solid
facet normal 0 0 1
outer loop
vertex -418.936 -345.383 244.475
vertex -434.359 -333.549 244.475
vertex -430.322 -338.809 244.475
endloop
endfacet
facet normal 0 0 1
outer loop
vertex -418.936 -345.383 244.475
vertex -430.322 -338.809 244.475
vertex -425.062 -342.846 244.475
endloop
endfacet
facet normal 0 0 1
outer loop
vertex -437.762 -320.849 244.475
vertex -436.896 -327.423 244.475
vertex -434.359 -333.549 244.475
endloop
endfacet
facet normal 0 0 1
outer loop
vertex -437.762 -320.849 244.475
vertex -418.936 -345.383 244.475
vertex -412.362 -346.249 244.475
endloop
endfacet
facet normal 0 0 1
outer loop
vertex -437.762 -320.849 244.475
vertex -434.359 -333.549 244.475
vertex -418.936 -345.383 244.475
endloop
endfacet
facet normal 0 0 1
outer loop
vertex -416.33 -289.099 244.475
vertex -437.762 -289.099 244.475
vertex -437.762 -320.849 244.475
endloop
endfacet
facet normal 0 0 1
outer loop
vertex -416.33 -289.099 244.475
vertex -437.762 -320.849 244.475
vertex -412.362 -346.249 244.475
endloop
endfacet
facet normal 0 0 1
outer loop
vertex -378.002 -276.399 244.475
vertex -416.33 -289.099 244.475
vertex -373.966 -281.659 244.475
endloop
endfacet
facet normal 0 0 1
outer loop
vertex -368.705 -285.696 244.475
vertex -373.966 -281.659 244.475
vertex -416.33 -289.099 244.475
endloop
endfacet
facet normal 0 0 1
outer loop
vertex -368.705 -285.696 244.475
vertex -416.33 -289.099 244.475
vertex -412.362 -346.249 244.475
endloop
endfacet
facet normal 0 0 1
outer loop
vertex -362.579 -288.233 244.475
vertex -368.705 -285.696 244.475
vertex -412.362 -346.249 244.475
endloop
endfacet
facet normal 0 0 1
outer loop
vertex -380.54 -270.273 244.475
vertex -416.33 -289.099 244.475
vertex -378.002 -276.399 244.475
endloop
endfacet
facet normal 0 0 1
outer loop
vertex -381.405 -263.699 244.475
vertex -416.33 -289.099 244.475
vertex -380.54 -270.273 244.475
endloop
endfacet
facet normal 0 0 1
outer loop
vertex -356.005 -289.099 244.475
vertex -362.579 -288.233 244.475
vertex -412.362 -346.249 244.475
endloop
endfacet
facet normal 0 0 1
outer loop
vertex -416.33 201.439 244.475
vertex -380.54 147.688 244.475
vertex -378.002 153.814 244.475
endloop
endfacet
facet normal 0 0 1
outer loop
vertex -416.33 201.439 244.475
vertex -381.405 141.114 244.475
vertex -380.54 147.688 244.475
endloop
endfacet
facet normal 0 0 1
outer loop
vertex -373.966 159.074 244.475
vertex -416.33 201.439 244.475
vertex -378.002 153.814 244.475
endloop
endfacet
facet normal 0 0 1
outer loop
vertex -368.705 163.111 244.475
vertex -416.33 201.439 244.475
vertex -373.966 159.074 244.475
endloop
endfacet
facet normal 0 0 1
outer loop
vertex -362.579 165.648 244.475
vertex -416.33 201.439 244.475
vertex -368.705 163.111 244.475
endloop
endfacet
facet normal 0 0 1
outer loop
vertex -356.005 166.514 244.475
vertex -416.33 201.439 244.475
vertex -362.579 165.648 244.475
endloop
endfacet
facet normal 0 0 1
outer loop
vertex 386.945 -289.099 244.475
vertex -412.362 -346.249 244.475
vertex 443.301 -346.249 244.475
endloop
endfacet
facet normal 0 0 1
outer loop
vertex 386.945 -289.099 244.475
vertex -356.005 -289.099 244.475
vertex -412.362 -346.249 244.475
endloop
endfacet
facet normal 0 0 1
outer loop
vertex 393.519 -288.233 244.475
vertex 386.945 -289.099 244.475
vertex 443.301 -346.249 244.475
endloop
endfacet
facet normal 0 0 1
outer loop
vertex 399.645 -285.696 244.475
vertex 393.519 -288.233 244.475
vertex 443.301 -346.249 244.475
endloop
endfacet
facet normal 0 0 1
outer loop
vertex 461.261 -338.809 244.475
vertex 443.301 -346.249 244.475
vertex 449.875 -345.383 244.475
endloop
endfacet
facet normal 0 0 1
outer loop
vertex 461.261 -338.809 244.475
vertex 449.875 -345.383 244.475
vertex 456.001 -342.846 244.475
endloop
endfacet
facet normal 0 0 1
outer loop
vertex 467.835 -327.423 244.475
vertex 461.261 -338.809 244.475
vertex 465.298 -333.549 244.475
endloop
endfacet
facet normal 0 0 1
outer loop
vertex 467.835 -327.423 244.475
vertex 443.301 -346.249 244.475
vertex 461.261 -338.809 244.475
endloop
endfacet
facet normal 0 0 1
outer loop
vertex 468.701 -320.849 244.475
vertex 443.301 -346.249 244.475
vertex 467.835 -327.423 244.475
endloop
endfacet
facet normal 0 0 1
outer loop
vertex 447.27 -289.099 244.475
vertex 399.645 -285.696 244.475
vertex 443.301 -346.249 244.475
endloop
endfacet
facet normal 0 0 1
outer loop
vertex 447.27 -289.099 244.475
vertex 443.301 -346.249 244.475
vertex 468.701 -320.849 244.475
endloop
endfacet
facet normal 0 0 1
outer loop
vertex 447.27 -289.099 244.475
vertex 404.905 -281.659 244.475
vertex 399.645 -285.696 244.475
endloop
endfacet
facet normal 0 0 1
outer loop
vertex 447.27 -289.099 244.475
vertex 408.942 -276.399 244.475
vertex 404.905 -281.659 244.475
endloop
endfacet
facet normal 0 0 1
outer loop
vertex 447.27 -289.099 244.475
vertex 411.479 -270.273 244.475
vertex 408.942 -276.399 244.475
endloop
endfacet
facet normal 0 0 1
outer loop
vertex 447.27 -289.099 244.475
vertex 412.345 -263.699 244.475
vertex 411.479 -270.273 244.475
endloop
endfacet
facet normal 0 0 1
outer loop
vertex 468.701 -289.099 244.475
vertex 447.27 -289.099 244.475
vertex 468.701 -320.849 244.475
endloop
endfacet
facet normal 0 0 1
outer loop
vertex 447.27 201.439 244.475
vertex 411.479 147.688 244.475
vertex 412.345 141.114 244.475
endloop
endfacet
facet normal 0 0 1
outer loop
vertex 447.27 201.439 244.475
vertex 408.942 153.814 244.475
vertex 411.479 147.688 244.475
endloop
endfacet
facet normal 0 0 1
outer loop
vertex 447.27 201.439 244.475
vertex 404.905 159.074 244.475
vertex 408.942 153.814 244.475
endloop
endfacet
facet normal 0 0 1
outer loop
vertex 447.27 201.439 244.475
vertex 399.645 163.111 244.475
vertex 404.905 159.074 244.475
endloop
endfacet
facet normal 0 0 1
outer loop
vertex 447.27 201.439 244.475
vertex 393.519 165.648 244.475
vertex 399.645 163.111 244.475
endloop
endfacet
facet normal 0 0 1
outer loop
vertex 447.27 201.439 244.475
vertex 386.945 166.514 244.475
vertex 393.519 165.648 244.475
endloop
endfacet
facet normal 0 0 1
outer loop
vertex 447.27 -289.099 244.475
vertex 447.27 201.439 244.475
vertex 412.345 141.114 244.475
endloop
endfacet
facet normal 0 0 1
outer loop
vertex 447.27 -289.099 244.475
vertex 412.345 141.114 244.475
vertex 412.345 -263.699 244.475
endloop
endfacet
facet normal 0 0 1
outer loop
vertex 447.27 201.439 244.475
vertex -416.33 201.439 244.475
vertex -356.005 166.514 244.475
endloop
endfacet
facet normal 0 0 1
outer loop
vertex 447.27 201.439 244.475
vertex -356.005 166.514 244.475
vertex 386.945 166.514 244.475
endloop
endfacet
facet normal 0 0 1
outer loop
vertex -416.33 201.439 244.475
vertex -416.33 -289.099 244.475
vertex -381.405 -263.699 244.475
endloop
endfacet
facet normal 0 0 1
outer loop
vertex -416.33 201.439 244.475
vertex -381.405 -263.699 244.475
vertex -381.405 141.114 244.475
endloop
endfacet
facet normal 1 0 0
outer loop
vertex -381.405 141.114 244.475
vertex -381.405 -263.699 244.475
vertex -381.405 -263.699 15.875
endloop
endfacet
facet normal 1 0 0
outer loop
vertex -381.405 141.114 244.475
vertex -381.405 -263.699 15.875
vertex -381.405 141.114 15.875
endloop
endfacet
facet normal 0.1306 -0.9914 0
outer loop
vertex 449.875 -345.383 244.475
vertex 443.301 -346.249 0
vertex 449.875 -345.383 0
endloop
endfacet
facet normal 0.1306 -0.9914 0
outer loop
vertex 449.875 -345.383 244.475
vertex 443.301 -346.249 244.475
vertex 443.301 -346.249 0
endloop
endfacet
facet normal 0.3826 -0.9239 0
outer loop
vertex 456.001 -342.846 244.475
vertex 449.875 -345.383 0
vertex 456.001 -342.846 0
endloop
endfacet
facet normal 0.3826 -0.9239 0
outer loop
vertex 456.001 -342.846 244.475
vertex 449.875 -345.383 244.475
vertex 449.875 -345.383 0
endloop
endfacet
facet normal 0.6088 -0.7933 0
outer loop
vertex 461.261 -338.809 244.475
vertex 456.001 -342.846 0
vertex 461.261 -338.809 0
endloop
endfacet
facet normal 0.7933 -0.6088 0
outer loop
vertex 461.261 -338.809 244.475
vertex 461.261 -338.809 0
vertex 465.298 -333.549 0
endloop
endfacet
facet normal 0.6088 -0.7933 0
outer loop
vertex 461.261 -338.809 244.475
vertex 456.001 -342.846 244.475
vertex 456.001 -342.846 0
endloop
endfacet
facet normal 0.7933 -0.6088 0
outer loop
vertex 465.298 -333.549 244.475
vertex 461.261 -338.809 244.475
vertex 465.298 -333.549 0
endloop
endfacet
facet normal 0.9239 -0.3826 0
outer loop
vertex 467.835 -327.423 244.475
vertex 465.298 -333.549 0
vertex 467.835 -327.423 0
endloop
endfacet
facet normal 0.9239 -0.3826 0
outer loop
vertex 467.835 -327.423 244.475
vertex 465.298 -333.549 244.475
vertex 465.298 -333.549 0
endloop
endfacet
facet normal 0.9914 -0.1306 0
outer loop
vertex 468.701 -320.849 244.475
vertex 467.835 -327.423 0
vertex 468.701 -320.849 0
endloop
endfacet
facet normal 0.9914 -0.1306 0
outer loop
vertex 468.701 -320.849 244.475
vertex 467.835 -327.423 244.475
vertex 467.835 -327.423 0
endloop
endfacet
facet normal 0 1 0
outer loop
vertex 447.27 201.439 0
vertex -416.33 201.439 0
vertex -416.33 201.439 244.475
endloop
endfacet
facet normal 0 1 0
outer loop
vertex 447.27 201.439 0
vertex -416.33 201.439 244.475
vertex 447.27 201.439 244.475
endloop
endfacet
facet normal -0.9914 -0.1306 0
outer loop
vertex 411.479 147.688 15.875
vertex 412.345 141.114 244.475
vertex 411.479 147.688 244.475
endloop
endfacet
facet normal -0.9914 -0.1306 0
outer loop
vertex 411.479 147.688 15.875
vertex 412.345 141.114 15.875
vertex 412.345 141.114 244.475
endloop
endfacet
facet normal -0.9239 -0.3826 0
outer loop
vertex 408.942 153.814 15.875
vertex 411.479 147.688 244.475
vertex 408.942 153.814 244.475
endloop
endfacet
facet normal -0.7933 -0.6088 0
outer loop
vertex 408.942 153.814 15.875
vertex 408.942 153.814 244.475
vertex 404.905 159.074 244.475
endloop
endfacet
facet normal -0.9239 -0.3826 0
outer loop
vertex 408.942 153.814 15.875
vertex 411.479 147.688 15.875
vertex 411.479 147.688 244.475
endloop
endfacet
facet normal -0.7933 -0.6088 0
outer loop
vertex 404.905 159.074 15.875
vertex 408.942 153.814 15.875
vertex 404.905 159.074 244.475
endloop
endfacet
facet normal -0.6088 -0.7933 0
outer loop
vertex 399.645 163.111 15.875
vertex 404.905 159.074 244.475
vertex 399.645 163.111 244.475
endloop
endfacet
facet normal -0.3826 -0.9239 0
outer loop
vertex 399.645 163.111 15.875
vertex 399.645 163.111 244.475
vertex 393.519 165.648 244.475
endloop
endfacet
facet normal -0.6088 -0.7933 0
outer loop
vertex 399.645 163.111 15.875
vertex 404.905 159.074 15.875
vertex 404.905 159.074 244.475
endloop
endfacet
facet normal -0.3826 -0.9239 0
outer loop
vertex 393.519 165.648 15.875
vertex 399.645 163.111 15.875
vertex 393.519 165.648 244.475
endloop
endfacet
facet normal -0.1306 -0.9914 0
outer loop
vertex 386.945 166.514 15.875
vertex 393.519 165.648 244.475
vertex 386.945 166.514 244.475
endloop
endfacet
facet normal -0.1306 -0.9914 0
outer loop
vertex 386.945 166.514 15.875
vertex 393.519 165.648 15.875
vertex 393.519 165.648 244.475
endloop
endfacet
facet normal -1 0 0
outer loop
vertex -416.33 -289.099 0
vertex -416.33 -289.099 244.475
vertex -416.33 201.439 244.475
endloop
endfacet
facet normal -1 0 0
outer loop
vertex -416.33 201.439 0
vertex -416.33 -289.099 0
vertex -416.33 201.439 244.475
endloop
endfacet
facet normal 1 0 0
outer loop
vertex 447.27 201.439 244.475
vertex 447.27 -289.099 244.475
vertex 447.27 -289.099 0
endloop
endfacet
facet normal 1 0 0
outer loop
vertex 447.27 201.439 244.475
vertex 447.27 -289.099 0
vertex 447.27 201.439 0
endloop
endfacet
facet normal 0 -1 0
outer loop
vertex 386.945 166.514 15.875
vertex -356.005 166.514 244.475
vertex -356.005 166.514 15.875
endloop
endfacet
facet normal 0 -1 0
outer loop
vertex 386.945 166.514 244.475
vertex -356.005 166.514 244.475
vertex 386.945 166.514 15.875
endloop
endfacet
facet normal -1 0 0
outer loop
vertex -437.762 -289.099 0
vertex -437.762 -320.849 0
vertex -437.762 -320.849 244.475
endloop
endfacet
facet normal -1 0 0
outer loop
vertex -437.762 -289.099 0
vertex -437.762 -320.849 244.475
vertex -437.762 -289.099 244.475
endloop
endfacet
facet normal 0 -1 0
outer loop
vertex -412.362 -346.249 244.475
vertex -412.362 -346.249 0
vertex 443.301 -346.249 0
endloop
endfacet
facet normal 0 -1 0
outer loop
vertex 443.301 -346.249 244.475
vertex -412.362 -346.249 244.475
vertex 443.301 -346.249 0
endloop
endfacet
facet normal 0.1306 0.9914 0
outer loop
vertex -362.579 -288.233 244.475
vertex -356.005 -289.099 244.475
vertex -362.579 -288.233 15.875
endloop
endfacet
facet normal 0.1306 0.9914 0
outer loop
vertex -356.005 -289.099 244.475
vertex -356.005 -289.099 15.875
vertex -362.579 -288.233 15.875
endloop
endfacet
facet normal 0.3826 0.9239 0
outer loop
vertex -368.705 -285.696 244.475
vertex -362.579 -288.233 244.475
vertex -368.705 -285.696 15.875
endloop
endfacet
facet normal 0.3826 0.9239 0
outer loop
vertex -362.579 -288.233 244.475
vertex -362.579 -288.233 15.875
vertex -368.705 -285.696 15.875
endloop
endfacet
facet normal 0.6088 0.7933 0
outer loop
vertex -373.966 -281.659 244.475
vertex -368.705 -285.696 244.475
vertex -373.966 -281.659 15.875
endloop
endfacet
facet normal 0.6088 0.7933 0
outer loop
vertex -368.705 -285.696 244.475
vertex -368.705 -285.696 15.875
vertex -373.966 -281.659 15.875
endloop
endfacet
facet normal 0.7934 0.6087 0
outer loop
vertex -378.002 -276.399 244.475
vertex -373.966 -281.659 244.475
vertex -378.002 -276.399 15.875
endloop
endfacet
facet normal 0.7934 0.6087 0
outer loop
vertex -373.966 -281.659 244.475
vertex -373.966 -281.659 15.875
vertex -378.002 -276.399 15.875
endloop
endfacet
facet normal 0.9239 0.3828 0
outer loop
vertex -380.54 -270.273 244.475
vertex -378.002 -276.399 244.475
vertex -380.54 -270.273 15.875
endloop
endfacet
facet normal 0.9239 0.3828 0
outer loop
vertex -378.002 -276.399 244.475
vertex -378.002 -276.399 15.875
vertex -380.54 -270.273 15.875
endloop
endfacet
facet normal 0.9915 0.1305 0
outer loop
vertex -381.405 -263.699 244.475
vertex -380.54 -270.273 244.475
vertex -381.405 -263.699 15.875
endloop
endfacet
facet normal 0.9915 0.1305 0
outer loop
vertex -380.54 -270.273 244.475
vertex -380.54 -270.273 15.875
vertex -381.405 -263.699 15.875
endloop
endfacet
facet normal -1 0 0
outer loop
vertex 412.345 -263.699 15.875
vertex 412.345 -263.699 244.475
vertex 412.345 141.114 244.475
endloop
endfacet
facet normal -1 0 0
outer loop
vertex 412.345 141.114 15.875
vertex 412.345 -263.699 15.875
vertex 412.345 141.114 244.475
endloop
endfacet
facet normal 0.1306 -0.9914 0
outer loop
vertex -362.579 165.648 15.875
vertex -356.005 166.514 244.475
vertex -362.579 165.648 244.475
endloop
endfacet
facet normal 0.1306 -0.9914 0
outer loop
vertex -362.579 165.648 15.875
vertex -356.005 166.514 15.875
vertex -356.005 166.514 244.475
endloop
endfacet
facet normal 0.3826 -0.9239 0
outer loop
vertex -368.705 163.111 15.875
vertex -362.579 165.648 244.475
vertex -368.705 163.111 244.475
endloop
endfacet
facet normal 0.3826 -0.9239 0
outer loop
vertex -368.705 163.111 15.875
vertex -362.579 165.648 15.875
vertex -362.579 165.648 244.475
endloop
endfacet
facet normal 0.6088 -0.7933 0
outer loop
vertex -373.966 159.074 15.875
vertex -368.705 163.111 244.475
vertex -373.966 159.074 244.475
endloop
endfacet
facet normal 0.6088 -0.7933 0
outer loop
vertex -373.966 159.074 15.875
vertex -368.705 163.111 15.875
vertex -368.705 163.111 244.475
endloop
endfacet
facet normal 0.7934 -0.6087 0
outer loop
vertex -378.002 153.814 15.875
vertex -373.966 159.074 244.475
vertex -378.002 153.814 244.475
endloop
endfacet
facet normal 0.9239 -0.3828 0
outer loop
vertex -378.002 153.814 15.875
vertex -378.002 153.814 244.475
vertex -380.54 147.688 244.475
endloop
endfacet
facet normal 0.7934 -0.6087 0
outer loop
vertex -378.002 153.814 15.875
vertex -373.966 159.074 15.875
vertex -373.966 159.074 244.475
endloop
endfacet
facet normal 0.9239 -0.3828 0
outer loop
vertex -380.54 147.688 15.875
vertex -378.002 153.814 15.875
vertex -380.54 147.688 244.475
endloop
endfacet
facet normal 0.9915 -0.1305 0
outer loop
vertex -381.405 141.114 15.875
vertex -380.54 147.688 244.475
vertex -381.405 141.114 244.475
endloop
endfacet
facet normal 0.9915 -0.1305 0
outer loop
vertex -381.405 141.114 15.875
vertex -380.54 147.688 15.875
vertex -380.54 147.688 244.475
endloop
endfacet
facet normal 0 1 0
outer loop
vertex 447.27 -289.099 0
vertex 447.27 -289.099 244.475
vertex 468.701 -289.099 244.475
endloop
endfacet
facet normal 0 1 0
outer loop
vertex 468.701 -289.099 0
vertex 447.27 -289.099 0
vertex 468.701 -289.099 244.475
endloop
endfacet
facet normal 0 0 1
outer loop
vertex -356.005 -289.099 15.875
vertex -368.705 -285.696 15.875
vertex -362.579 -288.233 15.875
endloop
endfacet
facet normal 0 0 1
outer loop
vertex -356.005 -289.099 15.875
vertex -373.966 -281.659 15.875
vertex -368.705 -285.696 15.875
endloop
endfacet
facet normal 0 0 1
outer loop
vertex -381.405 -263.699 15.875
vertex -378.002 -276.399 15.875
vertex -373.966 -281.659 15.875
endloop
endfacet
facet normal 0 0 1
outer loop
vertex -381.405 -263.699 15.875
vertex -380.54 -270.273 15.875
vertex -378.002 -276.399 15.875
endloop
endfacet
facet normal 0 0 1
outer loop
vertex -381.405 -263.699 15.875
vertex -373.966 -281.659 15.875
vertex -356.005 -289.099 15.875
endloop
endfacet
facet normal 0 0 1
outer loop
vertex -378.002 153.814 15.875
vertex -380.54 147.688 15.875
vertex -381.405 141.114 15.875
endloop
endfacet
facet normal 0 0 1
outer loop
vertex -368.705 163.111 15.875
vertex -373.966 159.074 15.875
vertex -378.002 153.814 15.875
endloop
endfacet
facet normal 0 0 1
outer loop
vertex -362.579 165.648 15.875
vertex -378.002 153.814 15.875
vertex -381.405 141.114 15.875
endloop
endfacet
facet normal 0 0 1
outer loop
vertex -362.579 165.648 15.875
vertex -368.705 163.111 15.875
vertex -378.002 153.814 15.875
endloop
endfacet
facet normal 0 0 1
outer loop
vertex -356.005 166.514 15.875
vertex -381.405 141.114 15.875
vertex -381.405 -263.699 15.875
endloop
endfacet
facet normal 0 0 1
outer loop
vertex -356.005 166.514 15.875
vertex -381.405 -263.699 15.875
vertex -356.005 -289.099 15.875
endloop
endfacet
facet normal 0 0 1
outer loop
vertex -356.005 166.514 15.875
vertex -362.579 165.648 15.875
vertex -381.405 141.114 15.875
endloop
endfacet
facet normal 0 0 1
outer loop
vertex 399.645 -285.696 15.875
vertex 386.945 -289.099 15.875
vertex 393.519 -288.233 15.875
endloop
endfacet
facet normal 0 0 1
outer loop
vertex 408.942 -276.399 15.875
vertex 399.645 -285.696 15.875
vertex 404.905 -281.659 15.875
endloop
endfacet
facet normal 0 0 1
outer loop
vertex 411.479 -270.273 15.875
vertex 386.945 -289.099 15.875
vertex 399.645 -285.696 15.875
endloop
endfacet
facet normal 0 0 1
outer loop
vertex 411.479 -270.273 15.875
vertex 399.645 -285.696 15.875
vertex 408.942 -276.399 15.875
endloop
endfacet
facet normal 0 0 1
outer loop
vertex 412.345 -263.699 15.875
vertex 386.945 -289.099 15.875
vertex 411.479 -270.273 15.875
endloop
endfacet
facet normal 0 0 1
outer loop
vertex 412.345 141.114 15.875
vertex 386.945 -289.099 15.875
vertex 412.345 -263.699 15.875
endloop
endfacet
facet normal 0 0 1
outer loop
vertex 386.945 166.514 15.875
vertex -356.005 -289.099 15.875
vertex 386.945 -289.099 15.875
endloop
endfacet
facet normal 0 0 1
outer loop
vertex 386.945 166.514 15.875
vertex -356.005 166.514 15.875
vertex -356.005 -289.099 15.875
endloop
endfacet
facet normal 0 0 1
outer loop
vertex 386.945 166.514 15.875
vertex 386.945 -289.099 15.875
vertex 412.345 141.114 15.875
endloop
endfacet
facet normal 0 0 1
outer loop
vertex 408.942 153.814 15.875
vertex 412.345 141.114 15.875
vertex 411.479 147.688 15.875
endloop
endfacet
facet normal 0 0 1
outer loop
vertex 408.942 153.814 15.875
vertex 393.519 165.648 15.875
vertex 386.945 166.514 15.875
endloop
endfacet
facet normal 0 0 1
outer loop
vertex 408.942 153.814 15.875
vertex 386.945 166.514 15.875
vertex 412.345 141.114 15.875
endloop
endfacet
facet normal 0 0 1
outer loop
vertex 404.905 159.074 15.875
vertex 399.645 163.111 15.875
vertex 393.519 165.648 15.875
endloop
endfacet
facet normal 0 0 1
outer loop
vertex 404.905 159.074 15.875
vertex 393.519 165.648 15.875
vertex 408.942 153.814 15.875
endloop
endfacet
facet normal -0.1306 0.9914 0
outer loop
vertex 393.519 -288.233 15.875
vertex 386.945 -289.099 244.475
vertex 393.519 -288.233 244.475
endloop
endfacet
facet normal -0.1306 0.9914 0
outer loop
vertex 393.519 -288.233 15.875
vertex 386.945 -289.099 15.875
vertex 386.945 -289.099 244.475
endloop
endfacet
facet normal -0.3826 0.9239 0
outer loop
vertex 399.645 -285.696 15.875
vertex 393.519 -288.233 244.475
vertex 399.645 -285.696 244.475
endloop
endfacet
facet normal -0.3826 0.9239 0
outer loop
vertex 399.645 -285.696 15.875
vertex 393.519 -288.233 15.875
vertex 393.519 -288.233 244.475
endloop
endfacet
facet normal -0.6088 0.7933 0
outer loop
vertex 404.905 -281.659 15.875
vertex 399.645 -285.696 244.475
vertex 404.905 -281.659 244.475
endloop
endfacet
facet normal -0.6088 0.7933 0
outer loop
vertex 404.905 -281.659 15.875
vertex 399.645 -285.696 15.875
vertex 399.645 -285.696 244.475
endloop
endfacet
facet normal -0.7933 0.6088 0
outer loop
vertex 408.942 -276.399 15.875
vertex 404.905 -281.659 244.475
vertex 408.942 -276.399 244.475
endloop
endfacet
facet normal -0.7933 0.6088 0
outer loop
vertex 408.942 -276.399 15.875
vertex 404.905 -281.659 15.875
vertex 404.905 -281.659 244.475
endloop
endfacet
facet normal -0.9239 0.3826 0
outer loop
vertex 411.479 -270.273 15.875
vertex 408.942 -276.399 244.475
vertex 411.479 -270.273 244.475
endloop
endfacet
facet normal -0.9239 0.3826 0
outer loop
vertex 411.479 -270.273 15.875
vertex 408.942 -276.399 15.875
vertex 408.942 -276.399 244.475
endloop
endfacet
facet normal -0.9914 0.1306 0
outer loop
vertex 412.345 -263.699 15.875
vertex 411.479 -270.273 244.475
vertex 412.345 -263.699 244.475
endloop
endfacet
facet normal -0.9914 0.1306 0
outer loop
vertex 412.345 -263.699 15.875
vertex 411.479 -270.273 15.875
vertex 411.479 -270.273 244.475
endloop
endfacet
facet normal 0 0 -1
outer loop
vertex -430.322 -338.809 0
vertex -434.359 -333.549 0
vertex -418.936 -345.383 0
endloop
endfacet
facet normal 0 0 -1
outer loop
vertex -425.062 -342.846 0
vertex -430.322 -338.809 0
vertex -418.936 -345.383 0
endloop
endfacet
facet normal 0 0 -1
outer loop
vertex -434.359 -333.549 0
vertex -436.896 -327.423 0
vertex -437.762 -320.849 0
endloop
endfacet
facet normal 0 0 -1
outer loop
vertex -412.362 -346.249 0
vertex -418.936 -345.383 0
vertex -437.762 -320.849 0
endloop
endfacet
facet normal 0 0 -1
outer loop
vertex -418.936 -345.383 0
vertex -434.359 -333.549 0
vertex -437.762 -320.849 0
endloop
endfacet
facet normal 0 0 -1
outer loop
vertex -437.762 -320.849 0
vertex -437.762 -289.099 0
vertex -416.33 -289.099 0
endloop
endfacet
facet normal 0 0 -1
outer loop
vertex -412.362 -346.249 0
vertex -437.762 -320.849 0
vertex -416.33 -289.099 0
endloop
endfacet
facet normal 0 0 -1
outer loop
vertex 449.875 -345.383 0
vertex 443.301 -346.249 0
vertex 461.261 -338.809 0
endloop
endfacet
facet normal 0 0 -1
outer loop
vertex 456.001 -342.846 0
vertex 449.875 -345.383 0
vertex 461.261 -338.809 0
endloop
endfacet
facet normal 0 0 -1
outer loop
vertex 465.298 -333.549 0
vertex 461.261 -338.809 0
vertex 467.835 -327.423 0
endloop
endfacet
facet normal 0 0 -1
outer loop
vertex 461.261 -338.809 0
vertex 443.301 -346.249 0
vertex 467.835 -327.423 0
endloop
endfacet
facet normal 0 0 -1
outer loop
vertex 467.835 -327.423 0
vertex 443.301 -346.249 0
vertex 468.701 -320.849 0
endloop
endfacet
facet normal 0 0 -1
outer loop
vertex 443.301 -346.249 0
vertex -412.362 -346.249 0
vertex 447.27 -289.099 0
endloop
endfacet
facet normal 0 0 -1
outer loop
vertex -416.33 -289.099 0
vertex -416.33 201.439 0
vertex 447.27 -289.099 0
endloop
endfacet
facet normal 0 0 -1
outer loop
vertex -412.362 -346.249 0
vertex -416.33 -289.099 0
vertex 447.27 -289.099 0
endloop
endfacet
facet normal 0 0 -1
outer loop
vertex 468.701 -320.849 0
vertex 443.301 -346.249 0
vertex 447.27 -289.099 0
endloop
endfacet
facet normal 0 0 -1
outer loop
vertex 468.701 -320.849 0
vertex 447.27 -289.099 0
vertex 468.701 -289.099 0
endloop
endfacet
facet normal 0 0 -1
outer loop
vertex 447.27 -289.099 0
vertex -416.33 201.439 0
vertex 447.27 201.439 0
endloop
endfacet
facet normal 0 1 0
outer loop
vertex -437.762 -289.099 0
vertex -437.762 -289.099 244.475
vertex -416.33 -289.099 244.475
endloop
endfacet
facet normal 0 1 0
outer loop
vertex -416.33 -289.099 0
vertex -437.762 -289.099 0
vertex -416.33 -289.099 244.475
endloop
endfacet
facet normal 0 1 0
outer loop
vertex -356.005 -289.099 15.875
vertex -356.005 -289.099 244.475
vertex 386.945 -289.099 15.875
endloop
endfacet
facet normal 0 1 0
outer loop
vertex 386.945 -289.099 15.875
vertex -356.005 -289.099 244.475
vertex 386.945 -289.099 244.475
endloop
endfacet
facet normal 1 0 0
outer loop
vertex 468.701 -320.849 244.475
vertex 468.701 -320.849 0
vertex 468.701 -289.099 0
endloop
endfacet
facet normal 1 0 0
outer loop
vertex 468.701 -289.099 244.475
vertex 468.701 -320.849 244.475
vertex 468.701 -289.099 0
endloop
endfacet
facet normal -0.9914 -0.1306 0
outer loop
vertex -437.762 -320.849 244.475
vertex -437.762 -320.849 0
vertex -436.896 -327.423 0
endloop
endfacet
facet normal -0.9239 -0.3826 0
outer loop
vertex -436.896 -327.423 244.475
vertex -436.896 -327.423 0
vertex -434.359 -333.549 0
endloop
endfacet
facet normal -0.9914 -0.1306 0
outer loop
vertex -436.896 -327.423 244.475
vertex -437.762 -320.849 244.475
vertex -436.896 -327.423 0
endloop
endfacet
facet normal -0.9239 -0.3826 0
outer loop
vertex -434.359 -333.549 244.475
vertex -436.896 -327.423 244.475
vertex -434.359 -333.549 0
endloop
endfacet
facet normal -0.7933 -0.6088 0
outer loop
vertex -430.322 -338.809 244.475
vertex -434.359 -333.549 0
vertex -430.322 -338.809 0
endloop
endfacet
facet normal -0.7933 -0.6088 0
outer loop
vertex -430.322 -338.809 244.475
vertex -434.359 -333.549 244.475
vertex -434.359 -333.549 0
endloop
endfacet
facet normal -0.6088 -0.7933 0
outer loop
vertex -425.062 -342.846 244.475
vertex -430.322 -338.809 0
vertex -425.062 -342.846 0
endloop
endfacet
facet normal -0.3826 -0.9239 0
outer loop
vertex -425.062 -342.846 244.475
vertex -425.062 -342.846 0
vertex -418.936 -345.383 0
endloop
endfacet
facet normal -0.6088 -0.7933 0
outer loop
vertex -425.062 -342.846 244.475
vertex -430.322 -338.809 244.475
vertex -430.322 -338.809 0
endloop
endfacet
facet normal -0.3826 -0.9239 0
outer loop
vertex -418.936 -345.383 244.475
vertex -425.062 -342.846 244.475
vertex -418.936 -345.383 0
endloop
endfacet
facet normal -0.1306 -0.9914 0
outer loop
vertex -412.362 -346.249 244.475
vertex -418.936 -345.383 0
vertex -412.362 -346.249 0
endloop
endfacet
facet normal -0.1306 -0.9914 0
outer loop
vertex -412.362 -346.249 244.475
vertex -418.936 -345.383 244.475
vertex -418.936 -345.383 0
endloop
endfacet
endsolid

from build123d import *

# Parameters (mm, degrees)
F0_W     = 906.4625
F0_H     = 547.6875
F1_DEPTH = 244.475
F2_W     = 21.43125
F2_H     = 490.5375
F3_DEPTH = 244.476
F4_R     = 25.4
F5_W     = 793.75
F5_H     = 455.6125
F6_DEPTH = 228.6
F7_R     = 25.4


with BuildPart() as f1:
    # F0 (on Top) → F1 (new body)
    with BuildSketch(Plane.XY):
        with Locations((15.469722, -72.404954)):
            Rectangle(F0_W, F0_H)
    extrude(amount=F1_DEPTH)

    # F2 (on face) → F3 (cut, through all)
    with BuildSketch(Plane.XY.offset(244.475)):
        with Locations((-427.045903, -43.829954)):
            Rectangle(F2_W, F2_H)
        with Locations((457.985347, -43.829954)):
            Rectangle(F2_W, F2_H)
    extrude(amount=-F3_DEPTH, mode=Mode.SUBTRACT)

    # F4
    f4_edges = [f1.edges().sort_by_distance(p)[0] for p in [
        (-437.761528, -346.248704, 122.2375),
        (468.700972, -346.248704, 122.2375),
    ]]
    fillet(f4_edges, radius=F4_R)

    # F5 (on face) → F6 (cut)
    with BuildSketch(Plane.XY.offset(244.475)):
        with Locations((15.469722, -61.292454)):
            Rectangle(F5_W, F5_H)
    extrude(amount=-F6_DEPTH, mode=Mode.SUBTRACT)

    # F7
    f7_edges = [f1.edges().sort_by_distance(p)[0] for p in [
        (412.344722, 166.513796, 130.175),
        (-381.405278, 166.513796, 130.175),
        (-381.405278, -289.098704, 130.175),
        (412.344722, -289.098704, 130.175),
    ]]
    fillet(f7_edges, radius=F7_R)


solid = f1.part
